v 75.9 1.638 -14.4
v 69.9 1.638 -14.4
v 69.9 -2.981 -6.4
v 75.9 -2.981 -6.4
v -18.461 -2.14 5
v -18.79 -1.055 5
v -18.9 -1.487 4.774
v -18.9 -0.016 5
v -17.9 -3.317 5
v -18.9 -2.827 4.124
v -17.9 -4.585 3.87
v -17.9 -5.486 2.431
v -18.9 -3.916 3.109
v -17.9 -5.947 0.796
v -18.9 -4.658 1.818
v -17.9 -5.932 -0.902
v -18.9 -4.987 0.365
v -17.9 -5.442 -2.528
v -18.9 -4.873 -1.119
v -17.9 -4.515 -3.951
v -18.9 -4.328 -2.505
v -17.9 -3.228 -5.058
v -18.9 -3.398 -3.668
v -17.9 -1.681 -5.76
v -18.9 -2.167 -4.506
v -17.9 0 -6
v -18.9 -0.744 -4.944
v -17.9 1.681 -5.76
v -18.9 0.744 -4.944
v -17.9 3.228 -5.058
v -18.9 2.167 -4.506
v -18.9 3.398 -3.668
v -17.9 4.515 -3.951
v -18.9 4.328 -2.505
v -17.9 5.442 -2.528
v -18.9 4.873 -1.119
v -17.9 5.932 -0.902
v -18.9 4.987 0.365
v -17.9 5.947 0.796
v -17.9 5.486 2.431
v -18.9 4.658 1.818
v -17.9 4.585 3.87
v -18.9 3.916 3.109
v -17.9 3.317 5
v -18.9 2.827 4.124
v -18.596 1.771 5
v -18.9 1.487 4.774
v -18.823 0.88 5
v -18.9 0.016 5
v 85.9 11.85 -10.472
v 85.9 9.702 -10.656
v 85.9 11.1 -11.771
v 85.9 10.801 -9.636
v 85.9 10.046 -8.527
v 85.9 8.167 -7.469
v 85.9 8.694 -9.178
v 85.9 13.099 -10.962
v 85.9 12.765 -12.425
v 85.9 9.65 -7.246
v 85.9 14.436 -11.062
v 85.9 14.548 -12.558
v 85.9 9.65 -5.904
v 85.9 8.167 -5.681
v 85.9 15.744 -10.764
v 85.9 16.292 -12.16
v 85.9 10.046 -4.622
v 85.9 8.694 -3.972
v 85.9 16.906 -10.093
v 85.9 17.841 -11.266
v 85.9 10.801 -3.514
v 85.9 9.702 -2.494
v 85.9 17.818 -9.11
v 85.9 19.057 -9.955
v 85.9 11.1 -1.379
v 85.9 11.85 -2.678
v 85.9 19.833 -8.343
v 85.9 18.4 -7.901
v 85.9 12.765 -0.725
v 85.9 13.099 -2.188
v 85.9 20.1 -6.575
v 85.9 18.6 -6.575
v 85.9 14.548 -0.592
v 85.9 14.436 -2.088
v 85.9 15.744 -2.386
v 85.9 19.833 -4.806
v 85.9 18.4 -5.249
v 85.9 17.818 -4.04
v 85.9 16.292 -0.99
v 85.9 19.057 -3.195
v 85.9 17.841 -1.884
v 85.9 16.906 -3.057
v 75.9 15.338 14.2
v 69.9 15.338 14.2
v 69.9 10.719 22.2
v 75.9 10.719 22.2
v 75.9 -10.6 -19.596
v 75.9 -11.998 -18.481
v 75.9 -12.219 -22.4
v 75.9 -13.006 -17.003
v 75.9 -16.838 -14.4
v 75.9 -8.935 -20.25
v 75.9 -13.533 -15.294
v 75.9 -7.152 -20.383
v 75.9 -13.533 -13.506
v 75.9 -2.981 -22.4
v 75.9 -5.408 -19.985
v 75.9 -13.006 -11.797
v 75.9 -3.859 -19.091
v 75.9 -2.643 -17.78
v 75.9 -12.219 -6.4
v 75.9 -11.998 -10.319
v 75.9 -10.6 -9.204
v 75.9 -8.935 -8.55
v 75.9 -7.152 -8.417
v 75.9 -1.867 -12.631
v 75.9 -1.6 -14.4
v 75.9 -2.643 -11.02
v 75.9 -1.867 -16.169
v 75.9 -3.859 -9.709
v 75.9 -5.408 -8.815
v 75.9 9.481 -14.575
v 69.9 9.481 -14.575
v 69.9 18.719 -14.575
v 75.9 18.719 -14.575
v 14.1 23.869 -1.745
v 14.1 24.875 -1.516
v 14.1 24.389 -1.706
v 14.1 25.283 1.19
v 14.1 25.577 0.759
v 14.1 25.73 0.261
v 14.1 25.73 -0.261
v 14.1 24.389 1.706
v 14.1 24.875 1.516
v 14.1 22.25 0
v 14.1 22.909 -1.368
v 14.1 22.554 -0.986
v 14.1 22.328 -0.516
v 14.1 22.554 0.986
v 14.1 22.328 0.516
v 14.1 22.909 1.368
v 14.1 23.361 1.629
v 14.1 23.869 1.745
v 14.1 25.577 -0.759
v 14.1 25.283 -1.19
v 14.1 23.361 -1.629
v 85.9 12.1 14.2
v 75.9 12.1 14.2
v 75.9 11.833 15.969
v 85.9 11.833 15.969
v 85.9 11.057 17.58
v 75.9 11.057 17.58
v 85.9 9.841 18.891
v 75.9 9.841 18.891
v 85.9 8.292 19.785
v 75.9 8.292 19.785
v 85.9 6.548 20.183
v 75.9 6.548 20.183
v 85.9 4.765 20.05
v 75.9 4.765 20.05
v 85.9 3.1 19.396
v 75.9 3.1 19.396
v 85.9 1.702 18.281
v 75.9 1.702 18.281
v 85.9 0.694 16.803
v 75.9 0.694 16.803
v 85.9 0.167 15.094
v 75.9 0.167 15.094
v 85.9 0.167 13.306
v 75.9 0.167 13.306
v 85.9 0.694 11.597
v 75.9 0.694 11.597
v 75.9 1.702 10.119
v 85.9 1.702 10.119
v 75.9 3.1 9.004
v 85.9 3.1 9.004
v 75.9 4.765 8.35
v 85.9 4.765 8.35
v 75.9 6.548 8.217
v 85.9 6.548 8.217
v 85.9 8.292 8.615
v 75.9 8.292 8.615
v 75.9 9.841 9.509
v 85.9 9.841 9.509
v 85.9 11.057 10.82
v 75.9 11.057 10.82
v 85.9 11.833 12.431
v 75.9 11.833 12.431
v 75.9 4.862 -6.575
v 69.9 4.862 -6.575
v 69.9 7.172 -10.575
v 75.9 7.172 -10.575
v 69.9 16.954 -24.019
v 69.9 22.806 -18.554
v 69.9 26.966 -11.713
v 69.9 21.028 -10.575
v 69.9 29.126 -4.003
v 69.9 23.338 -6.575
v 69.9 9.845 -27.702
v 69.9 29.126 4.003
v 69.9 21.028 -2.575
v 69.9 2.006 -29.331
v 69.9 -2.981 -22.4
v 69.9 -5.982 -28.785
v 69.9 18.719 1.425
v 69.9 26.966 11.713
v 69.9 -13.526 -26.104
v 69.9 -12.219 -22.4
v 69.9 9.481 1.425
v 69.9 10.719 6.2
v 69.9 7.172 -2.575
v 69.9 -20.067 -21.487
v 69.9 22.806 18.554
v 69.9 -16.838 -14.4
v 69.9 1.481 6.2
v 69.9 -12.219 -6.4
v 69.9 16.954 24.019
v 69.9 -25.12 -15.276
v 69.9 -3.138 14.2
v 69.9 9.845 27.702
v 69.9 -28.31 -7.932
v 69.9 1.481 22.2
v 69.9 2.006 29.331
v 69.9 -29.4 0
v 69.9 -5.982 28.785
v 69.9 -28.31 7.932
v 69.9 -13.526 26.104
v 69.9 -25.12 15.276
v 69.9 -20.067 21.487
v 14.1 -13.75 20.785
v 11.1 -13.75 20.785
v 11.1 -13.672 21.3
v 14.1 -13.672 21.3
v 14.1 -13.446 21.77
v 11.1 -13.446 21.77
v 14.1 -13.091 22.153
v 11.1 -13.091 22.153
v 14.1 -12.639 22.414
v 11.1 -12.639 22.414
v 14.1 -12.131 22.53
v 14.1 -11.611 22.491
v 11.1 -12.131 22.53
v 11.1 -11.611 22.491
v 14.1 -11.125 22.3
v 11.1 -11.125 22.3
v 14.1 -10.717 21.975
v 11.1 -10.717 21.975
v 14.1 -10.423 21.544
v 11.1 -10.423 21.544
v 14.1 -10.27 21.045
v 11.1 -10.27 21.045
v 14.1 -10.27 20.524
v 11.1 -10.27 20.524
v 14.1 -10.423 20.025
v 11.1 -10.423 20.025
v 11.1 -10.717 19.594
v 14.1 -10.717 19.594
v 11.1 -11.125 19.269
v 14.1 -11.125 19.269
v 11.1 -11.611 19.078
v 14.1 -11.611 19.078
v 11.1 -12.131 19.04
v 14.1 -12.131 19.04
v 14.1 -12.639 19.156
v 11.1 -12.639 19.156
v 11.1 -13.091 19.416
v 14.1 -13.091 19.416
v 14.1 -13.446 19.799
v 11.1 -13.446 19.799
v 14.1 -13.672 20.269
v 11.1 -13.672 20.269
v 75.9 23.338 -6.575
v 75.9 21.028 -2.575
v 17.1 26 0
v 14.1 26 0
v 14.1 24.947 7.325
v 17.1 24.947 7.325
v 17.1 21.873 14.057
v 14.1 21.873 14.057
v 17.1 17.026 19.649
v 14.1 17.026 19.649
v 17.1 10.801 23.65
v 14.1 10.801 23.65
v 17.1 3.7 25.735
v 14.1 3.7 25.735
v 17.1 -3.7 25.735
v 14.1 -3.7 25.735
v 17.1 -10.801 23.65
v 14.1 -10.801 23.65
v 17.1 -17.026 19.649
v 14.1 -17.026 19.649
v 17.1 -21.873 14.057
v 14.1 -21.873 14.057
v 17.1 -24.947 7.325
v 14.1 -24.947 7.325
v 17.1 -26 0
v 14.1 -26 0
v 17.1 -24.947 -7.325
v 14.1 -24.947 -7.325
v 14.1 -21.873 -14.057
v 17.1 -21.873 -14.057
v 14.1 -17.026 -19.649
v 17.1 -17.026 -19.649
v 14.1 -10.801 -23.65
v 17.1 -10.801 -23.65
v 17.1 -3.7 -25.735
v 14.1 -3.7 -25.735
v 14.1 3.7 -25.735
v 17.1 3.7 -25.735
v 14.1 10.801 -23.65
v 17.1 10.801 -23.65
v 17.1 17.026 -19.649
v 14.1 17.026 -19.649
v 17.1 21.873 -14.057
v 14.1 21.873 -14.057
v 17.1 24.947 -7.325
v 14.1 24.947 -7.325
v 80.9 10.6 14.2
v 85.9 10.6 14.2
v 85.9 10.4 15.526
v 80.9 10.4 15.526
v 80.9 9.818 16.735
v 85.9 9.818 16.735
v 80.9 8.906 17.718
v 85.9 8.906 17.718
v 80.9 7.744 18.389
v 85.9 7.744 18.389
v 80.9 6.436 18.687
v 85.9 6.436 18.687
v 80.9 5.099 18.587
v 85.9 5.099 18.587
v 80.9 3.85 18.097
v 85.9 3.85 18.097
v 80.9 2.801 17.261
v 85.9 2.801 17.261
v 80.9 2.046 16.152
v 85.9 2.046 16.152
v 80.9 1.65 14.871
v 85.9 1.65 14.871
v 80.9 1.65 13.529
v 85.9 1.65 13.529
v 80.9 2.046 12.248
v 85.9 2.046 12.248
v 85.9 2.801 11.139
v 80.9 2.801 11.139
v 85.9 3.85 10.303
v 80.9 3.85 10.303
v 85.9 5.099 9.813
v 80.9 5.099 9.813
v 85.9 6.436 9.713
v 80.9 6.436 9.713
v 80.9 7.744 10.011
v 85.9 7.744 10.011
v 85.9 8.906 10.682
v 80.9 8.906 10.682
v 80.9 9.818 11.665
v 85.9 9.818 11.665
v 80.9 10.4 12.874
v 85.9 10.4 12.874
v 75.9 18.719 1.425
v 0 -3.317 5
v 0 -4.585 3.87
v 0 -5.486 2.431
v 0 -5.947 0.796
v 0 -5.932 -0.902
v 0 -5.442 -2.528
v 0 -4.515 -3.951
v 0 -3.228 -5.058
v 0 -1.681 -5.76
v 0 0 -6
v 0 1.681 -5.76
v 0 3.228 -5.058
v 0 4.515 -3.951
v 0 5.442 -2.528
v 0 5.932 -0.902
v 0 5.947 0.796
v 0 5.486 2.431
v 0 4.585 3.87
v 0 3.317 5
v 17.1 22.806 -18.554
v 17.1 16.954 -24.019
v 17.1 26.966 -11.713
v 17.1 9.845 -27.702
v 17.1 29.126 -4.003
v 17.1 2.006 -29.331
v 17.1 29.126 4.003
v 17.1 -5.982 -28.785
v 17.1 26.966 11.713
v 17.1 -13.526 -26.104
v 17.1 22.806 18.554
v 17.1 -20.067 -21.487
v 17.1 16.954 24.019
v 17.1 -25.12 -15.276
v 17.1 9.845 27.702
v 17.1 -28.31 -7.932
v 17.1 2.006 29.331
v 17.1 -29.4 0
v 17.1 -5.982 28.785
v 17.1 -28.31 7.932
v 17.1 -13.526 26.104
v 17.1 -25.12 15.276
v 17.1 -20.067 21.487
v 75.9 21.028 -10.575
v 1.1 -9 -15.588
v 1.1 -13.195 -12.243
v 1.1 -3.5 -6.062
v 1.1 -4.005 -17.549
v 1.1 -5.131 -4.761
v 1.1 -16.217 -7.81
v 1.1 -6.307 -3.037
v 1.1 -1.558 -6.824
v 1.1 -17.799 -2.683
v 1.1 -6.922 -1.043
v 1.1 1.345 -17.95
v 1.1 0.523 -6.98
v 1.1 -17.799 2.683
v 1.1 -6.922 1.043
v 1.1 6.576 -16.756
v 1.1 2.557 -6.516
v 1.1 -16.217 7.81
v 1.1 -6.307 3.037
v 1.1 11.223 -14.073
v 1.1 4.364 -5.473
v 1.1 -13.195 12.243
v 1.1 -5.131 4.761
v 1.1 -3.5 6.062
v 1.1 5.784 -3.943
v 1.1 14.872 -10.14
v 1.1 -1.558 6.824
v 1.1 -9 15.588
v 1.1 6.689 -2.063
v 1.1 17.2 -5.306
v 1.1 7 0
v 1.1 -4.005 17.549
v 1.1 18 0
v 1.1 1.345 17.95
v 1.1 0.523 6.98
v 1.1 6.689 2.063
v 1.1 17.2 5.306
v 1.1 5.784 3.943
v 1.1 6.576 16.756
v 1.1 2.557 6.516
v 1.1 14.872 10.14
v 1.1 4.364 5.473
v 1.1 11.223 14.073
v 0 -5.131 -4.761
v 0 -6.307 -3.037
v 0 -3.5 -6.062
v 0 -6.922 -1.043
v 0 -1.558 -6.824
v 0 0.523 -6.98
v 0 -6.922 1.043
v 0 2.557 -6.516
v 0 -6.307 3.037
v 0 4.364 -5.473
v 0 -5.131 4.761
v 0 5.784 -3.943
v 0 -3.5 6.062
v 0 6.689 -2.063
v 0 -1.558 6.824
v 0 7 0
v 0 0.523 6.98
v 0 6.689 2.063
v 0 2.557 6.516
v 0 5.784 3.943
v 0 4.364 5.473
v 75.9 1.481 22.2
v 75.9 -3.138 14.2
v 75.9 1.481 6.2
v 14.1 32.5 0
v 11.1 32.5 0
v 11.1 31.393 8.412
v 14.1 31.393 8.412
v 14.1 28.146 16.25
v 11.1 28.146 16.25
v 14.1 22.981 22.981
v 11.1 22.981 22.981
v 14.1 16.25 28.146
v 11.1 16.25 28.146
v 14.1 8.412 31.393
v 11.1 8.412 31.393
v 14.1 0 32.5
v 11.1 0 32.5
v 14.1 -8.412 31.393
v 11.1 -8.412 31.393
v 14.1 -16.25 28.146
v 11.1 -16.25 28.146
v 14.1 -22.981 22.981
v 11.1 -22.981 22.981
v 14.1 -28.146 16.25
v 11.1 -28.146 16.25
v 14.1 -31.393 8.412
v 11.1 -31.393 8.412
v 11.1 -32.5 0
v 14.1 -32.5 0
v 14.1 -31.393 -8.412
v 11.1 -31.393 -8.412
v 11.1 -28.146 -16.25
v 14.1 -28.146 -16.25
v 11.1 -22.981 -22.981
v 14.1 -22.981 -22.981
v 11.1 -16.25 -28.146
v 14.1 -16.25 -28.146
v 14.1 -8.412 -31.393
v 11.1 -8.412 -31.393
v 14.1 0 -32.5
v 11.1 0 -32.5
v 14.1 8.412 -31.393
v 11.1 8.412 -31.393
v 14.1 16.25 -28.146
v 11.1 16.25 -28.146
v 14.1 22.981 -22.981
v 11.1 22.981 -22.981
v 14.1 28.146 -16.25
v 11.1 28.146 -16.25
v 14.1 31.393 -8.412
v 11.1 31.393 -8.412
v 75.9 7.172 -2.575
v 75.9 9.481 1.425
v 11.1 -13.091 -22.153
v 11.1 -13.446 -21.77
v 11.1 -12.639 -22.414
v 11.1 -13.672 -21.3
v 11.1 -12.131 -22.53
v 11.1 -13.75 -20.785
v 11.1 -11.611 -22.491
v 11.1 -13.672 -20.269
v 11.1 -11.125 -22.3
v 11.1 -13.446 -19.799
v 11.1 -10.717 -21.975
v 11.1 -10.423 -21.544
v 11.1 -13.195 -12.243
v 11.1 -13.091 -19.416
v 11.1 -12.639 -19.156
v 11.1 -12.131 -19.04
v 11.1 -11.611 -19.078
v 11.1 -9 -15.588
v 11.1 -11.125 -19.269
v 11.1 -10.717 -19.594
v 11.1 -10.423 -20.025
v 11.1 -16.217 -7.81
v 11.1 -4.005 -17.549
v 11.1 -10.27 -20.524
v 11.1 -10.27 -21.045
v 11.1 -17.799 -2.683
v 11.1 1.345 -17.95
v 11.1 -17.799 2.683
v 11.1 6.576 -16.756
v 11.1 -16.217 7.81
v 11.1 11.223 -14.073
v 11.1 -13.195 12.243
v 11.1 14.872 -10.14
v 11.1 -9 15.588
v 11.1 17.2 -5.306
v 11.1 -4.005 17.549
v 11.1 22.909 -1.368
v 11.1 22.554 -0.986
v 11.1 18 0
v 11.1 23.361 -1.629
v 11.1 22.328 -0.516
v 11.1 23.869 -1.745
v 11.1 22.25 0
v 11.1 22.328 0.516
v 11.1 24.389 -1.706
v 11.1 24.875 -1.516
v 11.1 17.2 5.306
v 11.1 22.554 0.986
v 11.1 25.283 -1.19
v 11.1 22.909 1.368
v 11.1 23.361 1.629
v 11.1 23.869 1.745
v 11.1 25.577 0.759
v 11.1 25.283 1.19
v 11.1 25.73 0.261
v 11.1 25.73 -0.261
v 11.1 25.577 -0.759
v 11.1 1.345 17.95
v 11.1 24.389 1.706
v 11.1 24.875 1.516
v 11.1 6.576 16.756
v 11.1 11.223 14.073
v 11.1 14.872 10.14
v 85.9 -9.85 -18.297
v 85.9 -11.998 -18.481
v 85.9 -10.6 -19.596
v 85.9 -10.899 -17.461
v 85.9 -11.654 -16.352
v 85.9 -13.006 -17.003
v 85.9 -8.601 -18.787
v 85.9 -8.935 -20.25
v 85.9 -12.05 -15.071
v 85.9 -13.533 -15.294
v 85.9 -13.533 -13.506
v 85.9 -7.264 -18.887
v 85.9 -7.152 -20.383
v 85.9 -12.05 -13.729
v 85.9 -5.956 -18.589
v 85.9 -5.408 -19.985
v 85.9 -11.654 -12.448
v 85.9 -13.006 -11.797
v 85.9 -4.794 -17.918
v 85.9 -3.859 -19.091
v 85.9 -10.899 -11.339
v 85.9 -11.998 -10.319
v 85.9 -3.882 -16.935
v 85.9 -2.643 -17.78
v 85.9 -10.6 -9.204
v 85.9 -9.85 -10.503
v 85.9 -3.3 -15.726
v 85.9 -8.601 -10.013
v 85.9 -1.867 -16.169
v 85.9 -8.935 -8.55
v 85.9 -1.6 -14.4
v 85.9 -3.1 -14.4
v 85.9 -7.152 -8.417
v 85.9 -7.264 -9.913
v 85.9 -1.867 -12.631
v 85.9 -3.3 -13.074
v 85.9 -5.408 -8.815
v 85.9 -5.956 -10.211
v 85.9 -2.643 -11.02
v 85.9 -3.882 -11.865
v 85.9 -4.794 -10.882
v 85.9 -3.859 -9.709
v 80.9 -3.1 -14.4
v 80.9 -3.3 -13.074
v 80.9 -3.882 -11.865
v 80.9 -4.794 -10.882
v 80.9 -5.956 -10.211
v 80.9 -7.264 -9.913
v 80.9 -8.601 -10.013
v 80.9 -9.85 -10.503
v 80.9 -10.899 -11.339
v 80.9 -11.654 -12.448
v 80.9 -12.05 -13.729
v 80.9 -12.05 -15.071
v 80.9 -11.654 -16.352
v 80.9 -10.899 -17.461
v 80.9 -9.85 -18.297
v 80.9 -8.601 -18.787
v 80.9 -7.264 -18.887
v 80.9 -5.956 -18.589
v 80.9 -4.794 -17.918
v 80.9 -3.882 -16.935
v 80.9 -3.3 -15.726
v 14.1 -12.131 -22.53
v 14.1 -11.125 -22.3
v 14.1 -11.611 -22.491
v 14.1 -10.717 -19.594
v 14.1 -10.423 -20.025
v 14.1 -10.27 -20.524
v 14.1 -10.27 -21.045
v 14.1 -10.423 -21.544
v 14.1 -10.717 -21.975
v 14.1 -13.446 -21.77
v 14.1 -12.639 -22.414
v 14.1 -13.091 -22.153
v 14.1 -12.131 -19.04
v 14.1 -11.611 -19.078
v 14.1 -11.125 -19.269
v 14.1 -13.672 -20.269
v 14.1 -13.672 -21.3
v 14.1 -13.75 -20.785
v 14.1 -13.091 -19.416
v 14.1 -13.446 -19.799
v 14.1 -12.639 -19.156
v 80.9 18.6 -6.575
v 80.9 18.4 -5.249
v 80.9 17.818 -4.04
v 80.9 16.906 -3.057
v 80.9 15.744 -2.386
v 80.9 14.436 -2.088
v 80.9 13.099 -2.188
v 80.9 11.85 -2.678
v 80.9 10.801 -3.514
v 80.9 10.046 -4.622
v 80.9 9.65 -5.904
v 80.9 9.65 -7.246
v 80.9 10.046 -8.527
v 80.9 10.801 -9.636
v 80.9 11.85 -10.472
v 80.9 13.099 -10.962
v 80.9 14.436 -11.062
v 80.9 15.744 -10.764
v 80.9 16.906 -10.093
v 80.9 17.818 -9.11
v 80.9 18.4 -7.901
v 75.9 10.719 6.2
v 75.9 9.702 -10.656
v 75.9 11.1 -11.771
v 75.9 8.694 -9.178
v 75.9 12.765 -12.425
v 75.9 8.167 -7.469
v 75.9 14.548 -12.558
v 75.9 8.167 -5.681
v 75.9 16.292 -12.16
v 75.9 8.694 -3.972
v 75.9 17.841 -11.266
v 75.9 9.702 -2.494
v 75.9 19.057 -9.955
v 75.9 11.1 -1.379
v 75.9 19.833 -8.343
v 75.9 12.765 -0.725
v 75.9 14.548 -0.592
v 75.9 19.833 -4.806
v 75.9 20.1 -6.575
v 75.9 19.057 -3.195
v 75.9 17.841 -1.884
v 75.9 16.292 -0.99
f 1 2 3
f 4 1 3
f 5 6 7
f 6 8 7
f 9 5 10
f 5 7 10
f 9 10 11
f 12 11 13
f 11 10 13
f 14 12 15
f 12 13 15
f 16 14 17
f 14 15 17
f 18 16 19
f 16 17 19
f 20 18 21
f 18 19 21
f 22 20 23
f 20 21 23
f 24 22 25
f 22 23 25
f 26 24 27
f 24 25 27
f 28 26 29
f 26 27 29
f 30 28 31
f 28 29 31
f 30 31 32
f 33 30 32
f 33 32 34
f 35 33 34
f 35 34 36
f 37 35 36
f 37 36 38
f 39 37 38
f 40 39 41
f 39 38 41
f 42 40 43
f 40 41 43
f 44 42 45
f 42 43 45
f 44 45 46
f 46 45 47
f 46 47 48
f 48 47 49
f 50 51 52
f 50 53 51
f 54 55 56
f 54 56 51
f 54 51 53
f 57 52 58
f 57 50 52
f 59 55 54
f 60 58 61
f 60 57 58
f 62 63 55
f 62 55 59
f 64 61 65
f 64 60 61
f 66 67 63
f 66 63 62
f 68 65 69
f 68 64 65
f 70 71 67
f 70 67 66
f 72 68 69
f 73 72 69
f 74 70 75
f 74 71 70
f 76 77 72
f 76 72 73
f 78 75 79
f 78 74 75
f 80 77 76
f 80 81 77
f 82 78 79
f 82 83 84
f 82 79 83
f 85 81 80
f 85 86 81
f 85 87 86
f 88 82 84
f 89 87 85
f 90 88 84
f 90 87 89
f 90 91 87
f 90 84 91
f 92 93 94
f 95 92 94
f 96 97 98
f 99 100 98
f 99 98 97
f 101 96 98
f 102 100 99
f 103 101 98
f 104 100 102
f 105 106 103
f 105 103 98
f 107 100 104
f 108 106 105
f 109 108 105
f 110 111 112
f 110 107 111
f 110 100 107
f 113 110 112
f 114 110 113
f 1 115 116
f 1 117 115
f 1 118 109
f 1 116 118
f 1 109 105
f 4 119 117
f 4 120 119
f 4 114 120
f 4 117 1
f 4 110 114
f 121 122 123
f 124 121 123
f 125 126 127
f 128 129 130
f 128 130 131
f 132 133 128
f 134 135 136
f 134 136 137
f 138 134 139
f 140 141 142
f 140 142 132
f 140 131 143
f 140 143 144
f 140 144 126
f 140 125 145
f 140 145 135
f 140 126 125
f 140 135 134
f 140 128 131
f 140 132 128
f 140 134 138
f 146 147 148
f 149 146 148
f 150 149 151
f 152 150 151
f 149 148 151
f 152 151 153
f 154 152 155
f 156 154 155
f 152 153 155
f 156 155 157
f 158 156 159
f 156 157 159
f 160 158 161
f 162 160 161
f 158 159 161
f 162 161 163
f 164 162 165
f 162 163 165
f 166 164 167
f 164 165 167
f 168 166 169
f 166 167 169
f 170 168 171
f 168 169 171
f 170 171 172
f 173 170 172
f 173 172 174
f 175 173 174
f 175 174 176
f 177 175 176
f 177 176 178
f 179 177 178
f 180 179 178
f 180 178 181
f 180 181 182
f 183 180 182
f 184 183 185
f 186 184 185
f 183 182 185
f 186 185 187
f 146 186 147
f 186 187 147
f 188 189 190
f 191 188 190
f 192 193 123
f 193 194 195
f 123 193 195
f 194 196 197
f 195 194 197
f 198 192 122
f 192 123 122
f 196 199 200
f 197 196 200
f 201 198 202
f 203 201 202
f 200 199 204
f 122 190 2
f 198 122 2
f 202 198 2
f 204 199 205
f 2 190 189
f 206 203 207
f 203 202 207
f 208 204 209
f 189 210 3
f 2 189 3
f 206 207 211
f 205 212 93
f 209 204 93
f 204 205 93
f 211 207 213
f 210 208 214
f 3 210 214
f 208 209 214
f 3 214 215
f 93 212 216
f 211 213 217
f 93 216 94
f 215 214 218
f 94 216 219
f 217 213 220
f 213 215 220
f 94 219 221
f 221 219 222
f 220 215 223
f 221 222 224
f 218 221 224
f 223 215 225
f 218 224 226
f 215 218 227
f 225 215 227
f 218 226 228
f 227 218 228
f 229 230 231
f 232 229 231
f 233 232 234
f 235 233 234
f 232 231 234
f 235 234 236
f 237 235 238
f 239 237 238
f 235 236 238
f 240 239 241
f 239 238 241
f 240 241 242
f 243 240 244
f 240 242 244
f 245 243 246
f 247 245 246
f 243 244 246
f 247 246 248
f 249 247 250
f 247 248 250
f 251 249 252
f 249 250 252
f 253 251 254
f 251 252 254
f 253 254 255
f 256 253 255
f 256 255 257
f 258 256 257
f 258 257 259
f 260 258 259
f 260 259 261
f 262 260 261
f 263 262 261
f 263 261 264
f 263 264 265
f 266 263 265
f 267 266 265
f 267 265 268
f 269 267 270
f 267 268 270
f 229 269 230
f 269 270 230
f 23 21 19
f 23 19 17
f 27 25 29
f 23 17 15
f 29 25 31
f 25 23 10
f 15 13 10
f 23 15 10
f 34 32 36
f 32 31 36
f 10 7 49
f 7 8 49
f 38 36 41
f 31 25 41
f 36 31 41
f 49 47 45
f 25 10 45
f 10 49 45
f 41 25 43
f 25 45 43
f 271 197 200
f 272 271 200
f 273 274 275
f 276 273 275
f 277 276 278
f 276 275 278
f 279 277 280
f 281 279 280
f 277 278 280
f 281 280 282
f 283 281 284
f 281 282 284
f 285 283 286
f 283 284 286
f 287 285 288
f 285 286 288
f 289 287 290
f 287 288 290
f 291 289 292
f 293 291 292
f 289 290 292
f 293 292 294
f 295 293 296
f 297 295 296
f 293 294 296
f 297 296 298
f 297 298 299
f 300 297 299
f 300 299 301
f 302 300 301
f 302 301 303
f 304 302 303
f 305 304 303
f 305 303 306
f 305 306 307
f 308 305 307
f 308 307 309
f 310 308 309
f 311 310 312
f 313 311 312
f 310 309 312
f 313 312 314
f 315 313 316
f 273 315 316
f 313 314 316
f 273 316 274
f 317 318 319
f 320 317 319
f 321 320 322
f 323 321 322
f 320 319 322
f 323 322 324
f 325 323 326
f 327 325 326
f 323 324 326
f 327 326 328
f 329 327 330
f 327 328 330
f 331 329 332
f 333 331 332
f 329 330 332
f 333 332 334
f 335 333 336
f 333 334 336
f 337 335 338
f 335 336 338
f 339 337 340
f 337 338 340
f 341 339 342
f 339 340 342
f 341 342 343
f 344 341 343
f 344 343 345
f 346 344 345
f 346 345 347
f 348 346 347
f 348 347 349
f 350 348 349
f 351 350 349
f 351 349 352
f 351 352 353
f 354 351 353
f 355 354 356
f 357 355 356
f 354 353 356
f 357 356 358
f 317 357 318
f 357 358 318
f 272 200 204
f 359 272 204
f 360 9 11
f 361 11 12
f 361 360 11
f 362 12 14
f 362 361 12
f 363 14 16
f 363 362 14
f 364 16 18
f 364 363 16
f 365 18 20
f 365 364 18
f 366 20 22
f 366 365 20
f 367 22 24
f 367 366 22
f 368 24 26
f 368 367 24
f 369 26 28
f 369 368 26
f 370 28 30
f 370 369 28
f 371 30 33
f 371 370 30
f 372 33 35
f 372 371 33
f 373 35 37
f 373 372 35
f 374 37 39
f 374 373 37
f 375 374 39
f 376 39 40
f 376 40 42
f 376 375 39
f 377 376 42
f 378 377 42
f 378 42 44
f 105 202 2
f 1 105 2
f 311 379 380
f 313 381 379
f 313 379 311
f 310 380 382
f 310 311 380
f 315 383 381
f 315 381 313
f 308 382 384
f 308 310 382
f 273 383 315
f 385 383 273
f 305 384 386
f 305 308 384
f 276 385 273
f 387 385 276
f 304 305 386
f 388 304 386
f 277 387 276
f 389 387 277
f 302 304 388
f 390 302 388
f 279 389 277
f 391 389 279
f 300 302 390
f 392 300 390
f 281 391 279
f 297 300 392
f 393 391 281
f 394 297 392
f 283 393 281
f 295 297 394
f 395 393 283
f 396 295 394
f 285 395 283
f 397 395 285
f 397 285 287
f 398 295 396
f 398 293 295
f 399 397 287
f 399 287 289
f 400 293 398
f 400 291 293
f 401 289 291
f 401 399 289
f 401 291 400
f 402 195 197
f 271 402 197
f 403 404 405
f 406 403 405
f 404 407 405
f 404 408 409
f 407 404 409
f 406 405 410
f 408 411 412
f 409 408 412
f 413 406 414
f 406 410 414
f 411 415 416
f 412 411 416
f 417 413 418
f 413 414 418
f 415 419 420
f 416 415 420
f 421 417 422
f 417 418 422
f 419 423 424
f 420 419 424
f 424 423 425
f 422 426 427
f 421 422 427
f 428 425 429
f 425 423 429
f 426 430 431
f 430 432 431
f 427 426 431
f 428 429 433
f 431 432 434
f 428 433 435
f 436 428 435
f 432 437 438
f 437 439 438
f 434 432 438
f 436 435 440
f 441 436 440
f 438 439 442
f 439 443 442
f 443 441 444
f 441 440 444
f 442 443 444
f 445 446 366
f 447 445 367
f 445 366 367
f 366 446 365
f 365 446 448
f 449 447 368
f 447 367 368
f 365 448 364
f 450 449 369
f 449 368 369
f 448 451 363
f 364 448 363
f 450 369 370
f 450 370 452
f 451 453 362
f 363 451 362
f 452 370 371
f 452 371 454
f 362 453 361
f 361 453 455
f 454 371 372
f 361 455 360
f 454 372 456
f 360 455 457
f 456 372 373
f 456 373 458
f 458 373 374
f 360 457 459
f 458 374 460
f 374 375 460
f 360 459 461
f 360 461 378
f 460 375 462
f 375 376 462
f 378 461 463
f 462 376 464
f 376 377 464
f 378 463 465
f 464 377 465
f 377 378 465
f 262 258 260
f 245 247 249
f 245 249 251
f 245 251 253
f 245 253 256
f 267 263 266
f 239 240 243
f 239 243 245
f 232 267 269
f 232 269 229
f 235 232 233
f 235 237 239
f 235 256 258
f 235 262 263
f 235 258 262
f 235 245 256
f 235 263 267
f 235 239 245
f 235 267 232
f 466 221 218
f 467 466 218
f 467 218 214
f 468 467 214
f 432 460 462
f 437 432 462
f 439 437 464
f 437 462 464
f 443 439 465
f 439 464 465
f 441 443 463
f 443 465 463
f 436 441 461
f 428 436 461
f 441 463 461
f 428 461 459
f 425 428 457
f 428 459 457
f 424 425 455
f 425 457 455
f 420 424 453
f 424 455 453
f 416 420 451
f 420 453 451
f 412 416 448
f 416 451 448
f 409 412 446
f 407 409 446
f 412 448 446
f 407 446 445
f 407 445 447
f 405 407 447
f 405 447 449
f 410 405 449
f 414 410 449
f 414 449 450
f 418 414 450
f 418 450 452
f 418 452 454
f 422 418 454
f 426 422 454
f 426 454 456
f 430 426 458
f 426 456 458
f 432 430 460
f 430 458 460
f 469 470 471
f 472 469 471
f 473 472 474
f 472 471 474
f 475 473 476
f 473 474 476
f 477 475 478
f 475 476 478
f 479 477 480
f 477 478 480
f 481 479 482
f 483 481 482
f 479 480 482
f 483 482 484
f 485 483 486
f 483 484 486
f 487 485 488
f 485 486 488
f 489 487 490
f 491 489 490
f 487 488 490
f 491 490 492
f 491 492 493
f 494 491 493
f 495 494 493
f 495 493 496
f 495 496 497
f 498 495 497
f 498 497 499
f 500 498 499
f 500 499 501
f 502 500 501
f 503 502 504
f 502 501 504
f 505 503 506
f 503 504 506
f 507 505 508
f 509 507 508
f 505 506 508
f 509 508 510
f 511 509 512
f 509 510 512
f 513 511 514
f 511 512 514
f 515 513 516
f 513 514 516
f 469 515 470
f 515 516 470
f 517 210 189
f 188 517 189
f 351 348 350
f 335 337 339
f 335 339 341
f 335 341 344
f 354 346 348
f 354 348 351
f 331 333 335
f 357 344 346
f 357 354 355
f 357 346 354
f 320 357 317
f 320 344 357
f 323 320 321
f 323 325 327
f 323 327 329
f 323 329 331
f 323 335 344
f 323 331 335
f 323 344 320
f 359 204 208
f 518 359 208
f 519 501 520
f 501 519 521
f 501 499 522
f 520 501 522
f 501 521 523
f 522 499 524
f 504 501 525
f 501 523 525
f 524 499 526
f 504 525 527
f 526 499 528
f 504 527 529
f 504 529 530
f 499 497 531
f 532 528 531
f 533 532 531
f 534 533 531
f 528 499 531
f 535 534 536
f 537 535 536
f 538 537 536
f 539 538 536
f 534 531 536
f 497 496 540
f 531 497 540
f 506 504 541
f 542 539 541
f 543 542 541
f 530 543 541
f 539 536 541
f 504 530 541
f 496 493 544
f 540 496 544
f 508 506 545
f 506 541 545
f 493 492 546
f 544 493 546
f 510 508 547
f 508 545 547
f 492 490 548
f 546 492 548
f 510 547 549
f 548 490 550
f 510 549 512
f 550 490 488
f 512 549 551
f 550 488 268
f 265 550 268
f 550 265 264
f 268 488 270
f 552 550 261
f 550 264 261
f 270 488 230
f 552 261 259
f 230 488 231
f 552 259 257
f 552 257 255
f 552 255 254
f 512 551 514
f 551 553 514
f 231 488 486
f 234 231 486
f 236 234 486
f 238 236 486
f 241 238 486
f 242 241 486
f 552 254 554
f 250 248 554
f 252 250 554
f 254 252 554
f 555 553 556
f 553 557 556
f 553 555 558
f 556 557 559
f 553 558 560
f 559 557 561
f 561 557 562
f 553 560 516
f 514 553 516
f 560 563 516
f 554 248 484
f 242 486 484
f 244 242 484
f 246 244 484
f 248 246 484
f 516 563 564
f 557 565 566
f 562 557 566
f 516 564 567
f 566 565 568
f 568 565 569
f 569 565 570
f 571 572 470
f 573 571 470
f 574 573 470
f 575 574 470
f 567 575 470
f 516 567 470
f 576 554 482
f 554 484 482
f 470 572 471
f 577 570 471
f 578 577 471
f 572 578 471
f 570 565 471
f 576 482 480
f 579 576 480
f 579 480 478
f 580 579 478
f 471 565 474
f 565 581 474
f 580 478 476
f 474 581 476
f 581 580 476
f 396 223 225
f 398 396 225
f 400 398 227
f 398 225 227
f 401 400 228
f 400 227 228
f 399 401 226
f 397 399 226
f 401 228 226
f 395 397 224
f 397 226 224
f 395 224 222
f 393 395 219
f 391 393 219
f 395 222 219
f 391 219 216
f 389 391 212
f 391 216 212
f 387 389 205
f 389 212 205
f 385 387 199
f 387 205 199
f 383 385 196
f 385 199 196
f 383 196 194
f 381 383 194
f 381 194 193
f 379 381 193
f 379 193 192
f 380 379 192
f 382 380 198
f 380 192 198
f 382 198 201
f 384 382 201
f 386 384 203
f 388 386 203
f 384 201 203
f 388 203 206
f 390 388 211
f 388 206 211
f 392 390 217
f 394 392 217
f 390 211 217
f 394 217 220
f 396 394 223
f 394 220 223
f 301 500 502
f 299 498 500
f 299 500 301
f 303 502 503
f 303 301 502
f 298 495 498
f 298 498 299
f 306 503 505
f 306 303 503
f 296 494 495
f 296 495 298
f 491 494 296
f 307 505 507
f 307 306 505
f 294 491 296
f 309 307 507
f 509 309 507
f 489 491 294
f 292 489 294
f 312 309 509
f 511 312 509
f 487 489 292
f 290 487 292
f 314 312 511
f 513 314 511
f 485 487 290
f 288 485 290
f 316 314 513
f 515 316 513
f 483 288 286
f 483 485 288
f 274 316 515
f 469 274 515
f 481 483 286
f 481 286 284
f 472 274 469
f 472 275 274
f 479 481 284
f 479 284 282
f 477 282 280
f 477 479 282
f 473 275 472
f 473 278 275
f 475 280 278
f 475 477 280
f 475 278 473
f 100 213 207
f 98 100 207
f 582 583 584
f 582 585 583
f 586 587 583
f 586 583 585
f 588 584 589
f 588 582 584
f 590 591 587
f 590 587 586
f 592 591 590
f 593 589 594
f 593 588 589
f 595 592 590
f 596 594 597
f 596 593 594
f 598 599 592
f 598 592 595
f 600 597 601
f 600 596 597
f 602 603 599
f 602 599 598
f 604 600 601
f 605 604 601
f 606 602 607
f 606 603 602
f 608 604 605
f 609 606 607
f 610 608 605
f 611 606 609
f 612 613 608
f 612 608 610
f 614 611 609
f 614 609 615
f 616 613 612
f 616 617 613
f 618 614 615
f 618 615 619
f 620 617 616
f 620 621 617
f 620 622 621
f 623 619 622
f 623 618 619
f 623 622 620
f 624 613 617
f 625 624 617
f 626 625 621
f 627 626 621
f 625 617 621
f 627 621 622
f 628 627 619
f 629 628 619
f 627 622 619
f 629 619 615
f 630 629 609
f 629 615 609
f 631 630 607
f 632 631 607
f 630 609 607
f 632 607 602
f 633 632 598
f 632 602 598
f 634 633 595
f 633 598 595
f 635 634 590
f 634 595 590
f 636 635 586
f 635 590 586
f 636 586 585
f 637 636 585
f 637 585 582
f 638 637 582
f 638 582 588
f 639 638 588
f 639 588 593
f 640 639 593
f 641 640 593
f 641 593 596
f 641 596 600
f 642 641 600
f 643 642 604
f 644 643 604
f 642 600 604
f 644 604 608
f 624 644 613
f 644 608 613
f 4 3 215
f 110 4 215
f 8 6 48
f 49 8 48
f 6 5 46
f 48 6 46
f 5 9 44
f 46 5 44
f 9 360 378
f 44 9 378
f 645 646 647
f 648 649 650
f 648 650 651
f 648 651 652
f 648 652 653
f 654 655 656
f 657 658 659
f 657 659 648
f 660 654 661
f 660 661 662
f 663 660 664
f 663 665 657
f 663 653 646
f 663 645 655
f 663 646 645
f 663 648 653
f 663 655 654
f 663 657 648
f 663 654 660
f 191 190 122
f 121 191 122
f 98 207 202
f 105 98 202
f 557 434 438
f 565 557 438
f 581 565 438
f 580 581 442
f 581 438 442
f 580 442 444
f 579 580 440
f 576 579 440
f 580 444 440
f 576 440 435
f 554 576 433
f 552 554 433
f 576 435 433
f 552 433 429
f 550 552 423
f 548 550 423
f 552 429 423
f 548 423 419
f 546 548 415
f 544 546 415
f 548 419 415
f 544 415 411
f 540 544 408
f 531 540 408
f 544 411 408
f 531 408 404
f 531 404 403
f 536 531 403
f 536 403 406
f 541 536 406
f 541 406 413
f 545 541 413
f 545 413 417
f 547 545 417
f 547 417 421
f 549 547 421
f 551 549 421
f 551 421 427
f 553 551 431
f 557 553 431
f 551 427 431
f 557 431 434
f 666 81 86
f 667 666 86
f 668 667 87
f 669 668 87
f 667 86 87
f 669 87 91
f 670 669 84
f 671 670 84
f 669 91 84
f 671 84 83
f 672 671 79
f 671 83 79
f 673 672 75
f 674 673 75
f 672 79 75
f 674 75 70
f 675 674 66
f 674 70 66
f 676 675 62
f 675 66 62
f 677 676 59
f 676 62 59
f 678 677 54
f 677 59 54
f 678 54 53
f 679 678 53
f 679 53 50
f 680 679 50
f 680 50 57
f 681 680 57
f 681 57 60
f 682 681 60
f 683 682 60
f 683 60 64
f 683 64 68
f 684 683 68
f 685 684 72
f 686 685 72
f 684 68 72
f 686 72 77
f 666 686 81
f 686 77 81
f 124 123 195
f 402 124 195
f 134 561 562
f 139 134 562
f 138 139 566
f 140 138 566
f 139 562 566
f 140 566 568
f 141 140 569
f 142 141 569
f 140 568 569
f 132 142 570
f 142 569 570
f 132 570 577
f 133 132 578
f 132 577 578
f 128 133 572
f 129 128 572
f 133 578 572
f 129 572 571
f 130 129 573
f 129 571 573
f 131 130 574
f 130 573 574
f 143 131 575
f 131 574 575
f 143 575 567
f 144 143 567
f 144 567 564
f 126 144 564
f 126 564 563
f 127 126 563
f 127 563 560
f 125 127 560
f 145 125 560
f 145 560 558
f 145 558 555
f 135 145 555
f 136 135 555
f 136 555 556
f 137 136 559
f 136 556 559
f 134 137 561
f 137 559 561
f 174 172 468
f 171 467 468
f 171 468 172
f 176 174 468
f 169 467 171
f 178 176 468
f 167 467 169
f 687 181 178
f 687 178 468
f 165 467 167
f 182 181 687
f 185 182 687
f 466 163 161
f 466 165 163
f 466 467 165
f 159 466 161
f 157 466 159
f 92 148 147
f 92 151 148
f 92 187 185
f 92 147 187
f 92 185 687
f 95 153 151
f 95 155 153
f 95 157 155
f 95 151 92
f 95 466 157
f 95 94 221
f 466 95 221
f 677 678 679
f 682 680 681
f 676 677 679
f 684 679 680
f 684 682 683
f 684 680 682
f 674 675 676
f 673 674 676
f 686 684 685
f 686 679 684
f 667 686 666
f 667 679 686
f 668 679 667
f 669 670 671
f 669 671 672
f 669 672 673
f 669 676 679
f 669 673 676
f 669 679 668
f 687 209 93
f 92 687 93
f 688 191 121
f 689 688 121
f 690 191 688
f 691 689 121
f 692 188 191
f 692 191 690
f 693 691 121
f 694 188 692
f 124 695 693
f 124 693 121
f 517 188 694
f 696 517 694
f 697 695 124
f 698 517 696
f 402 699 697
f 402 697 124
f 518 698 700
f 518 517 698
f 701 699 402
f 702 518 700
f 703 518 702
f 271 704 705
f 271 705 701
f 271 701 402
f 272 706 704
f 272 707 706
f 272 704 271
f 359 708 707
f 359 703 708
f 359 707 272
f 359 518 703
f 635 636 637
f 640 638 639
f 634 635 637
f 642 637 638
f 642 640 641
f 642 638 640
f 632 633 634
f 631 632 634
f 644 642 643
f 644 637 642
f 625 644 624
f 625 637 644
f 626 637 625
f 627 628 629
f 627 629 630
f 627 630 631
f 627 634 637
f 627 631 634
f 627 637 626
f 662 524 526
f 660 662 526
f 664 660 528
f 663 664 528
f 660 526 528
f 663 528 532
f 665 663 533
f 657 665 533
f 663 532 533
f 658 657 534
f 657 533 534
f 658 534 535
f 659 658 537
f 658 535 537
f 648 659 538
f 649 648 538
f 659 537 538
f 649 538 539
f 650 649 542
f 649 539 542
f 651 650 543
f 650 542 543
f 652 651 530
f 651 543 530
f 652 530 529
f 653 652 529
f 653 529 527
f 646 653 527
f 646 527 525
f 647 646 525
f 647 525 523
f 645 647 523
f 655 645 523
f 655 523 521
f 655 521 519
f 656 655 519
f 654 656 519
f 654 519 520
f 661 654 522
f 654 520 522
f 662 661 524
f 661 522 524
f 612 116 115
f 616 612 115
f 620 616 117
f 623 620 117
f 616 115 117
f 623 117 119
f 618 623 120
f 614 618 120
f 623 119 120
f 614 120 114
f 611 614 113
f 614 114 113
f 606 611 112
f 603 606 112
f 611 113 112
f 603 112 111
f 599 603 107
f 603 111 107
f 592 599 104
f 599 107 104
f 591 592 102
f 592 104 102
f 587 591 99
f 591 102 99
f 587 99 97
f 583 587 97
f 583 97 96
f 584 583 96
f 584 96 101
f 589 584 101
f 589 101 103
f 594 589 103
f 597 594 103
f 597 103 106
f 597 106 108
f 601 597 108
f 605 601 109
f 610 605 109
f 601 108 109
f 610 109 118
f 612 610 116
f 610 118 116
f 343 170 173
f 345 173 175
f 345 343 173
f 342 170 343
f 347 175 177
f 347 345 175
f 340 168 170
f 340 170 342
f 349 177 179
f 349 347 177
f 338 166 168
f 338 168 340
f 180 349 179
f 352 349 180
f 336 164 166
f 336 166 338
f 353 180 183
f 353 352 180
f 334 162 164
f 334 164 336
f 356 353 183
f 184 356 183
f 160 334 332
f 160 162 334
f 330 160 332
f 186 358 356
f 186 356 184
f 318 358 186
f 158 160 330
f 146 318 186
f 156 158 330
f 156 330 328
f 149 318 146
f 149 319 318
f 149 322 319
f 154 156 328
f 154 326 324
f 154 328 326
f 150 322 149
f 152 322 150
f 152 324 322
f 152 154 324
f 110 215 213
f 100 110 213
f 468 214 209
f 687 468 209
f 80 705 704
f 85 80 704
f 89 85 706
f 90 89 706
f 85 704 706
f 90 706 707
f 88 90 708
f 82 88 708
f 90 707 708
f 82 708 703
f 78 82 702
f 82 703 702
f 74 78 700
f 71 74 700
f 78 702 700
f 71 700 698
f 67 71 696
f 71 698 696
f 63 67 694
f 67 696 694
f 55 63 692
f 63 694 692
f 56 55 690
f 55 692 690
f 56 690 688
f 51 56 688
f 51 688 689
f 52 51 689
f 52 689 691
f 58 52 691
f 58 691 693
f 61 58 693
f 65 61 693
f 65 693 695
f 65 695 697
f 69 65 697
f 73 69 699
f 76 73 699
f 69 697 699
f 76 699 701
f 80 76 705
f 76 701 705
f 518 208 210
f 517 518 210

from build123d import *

# Parameters (mm, degrees)
F0_R        = 6
F1_DEPTH    = 18.9
F2_W        = 21.1690347642
F2_H        = 4.931249544
F3_DEPTH    = 18.901
F4_T2_ANGLE = 359.64
F5_R        = 7
F6_DEPTH    = 1.1
F7_R        = 18
F8_DEPTH    = 10
F9_R        = 32.5
F10_DEPTH   = 3
F11_R       = 26
F12_DEPTH   = 3
F14_R       = 29.4
F15_DEPTH   = 52.8
F16_R       = 1.75
F17_DEPTH   = 3
F19_DEPTH   = 6
F20_R       = 6
F21_DEPTH   = 10
F22_R       = 4.5
F23_DEPTH   = 5


# Not quite as in the source:
# - a fillet or chamfer that OpenCascade refuses, or shapes differently, is made with other operations: its cross-section is extruded or revolved along the edge and cut away or added


with BuildPart() as f1:
    # F0 (on Right) → F1 (new body)
    with BuildSketch(Plane.YZ):
        Circle(F0_R)
    extrude(amount=-F1_DEPTH)

    # F2 (on Right) → F3 (cut, through all)
    with BuildSketch(Plane.YZ):
        with Locations((0.0764410943, 7.465624772)):
            Rectangle(F2_W, F2_H)
    extrude(amount=-F3_DEPTH, mode=Mode.SUBTRACT)

    # F4: chamfer of 1 on 1 edges, made by hand

    # F4_s1 → F4_t2 (revolve, cut)
    with BuildSketch(Plane(origin=(0, 0, 0), x_dir=(1, 0, 0), z_dir=(0, 0.9999950652, 0.0031415875))):
        with BuildLine():
            Line((-17.8717157288, -6.0282842712), (-18.9282842712, -4.9717157288))
            Line((-18.9282842712, -4.9717157288), (-18.9482842712, -4.9717157288))
            ThreePointArc((-18.9482842712, -4.9717157288), (-18.92, -5.4858578644), (-18.92, -6))
            Line((-18.92, -6), (-18.9, -6.02))
            ThreePointArc((-18.9, -6.02), (-18.3858578644, -6.02), (-17.8717157288, -6.0482842712))
            Line((-17.8717157288, -6.0482842712), (-17.8717157288, -6.0282842712))
        make_face()
    revolve(axis=Axis((-18.9, 0, 0), (1, 0, 0)), revolution_arc=F4_T2_ANGLE, mode=Mode.SUBTRACT)

    # F5 (on face) → F6 (join)
    with BuildSketch(Plane.YZ):
        Circle(F5_R)
    extrude(amount=F6_DEPTH)

    # F7 (on face) → F8 (join)
    with BuildSketch(Plane.YZ.offset(1.1)):
        Circle(F7_R)
    extrude(amount=F8_DEPTH)

    # F9 (on face) → F10 (join)
    with BuildSketch(Plane.YZ.offset(11.1)):
        Circle(F9_R)
    extrude(amount=F10_DEPTH)

    # F11 (on face) → F12 (join)
    with BuildSketch(Plane.YZ.offset(14.1)):
        Circle(F11_R)
    extrude(amount=F12_DEPTH)

    # F14 (on offset) → F15 (join, through all)
    with BuildSketch(Plane(origin=(69.9, 0, 0), x_dir=(0, -1, 0), z_dir=(-1, 0, 0))):
        Circle(F14_R)
    extrude(amount=F15_DEPTH)

    # F16 (on face) → F17 (cut)
    with BuildSketch(Plane(origin=(11.1, 0, 0), x_dir=(0, -1, 0), z_dir=(-1, 0, 0))):
        with Locations((-24, 0)):
            Circle(F16_R)
        with Locations((12, -20.7846096908)):
            Circle(F16_R)
        with Locations((12, 20.7846096908)):
            Circle(F16_R)
    extrude(amount=-F17_DEPTH, mode=Mode.SUBTRACT)

    # F18 (on face) → F19 (join)
    with BuildSketch(Plane.YZ.offset(69.9)):
        with BuildLine():
            ThreePointArc((21.0282031968, -10.574938038), (21.8274066017, -8.6454903731), (22.1, -6.57493798))
            ThreePointArc((22.1, -6.57493798), (21.8274066078, -4.5043856099), (21.0282032207, -2.5749379634))
            ThreePointArc((21.0282032207, -2.5749379634), (18.0999999917, 0.3532652551), (14.1, 1.42506202))
            ThreePointArc((14.1, 1.42506202), (10.1000001451, 0.3532653341), (7.1717969373, -2.5749376897))
            ThreePointArc((7.1717969373, -2.5749376897), (6.1, -6.5749379695), (7.1717969269, -10.5749382522))
            ThreePointArc((7.1717969269, -10.5749382522), (10.1000001361, -13.5031412888), (14.1, -14.57493798))
            ThreePointArc((14.1, -14.57493798), (18.099999971, -13.503141227), (21.0282031968, -10.574938038))
        make_face()
        with BuildLine():
            ThreePointArc((21.0282032207, -2.5749379634), (21.8274066078, -4.5043856099), (22.1, -6.57493798))
            ThreePointArc((22.1, -6.57493798), (21.8274066017, -8.6454903731), (21.0282031968, -10.574938038))
            Line((21.0282031968, -10.574938038), (23.337604307, -6.57493798))
            Line((23.337604307, -6.57493798), (21.0282032207, -2.5749379634))
        make_face()
        with BuildLine():
            ThreePointArc((14.1, 1.42506202), (18.0999999917, 0.3532652551), (21.0282032207, -2.5749379634))
            Line((21.0282032207, -2.5749379634), (18.7188021535, 1.42506202))
            Line((18.7188021535, 1.42506202), (14.1, 1.42506202))
        make_face()
        with BuildLine():
            Line((18.7188021535, -14.57493798), (21.0282031968, -10.574938038))
            ThreePointArc((21.0282031968, -10.574938038), (18.099999971, -13.503141227), (14.1, -14.57493798))
            Line((14.1, -14.57493798), (18.7188021535, -14.57493798))
        make_face()
        with BuildLine():
            ThreePointArc((7.1717969373, -2.5749376897), (10.1000001451, 0.3532653341), (14.1, 1.42506202))
            Line((14.1, 1.42506202), (9.4811978465, 1.42506202))
            Line((9.4811978465, 1.42506202), (7.1717969373, -2.5749376897))
        make_face()
        with BuildLine():
            Line((9.4811978465, -14.57493798), (14.1, -14.57493798))
            ThreePointArc((14.1, -14.57493798), (10.1000001361, -13.5031412888), (7.1717969269, -10.5749382522))
            Line((7.1717969269, -10.5749382522), (9.4811978465, -14.57493798))
        make_face()
        with BuildLine():
            ThreePointArc((7.1717969269, -10.5749382522), (6.1, -6.5749379695), (7.1717969373, -2.5749376897))
            Line((7.1717969373, -2.5749376897), (4.862395693, -6.57493798))
            Line((4.862395693, -6.57493798), (7.1717969269, -10.5749382522))
        make_face()
        Polygon((10.7188021535, 22.2), (1.4811978465, 22.2), (-3.137604307, 14.2), (1.4811978465, 6.2), (10.7188021535, 6.2), (15.337604307, 14.2), align=None)
        Polygon((-2.9811978465, -6.4), (-12.2188021535, -6.4), (-16.837604307, -14.4), (-12.2188021535, -22.4), (-2.9811978465, -22.4), (1.637604307, -14.4), align=None)
    extrude(amount=F19_DEPTH)

    # F20 (on face) → F21 (join)
    with BuildSketch(Plane.YZ.offset(75.9)):
        with Locations((6.1, 14.2)):
            Circle(F20_R)
        with Locations((14.1, -6.57493798)):
            Circle(F20_R)
        with Locations((-7.6, -14.4)):
            Circle(F20_R)
    extrude(amount=F21_DEPTH)

    # F22 (on face) → F23 (cut)
    with BuildSketch(Plane.YZ.offset(85.9)):
        with Locations((6.1, 14.2)):
            Circle(F22_R)
        with Locations((-7.6, -14.4)):
            Circle(F22_R)
        with Locations((14.1, -6.57493798)):
            Circle(F22_R)
    extrude(amount=-F23_DEPTH, mode=Mode.SUBTRACT)


solid = f1.part
